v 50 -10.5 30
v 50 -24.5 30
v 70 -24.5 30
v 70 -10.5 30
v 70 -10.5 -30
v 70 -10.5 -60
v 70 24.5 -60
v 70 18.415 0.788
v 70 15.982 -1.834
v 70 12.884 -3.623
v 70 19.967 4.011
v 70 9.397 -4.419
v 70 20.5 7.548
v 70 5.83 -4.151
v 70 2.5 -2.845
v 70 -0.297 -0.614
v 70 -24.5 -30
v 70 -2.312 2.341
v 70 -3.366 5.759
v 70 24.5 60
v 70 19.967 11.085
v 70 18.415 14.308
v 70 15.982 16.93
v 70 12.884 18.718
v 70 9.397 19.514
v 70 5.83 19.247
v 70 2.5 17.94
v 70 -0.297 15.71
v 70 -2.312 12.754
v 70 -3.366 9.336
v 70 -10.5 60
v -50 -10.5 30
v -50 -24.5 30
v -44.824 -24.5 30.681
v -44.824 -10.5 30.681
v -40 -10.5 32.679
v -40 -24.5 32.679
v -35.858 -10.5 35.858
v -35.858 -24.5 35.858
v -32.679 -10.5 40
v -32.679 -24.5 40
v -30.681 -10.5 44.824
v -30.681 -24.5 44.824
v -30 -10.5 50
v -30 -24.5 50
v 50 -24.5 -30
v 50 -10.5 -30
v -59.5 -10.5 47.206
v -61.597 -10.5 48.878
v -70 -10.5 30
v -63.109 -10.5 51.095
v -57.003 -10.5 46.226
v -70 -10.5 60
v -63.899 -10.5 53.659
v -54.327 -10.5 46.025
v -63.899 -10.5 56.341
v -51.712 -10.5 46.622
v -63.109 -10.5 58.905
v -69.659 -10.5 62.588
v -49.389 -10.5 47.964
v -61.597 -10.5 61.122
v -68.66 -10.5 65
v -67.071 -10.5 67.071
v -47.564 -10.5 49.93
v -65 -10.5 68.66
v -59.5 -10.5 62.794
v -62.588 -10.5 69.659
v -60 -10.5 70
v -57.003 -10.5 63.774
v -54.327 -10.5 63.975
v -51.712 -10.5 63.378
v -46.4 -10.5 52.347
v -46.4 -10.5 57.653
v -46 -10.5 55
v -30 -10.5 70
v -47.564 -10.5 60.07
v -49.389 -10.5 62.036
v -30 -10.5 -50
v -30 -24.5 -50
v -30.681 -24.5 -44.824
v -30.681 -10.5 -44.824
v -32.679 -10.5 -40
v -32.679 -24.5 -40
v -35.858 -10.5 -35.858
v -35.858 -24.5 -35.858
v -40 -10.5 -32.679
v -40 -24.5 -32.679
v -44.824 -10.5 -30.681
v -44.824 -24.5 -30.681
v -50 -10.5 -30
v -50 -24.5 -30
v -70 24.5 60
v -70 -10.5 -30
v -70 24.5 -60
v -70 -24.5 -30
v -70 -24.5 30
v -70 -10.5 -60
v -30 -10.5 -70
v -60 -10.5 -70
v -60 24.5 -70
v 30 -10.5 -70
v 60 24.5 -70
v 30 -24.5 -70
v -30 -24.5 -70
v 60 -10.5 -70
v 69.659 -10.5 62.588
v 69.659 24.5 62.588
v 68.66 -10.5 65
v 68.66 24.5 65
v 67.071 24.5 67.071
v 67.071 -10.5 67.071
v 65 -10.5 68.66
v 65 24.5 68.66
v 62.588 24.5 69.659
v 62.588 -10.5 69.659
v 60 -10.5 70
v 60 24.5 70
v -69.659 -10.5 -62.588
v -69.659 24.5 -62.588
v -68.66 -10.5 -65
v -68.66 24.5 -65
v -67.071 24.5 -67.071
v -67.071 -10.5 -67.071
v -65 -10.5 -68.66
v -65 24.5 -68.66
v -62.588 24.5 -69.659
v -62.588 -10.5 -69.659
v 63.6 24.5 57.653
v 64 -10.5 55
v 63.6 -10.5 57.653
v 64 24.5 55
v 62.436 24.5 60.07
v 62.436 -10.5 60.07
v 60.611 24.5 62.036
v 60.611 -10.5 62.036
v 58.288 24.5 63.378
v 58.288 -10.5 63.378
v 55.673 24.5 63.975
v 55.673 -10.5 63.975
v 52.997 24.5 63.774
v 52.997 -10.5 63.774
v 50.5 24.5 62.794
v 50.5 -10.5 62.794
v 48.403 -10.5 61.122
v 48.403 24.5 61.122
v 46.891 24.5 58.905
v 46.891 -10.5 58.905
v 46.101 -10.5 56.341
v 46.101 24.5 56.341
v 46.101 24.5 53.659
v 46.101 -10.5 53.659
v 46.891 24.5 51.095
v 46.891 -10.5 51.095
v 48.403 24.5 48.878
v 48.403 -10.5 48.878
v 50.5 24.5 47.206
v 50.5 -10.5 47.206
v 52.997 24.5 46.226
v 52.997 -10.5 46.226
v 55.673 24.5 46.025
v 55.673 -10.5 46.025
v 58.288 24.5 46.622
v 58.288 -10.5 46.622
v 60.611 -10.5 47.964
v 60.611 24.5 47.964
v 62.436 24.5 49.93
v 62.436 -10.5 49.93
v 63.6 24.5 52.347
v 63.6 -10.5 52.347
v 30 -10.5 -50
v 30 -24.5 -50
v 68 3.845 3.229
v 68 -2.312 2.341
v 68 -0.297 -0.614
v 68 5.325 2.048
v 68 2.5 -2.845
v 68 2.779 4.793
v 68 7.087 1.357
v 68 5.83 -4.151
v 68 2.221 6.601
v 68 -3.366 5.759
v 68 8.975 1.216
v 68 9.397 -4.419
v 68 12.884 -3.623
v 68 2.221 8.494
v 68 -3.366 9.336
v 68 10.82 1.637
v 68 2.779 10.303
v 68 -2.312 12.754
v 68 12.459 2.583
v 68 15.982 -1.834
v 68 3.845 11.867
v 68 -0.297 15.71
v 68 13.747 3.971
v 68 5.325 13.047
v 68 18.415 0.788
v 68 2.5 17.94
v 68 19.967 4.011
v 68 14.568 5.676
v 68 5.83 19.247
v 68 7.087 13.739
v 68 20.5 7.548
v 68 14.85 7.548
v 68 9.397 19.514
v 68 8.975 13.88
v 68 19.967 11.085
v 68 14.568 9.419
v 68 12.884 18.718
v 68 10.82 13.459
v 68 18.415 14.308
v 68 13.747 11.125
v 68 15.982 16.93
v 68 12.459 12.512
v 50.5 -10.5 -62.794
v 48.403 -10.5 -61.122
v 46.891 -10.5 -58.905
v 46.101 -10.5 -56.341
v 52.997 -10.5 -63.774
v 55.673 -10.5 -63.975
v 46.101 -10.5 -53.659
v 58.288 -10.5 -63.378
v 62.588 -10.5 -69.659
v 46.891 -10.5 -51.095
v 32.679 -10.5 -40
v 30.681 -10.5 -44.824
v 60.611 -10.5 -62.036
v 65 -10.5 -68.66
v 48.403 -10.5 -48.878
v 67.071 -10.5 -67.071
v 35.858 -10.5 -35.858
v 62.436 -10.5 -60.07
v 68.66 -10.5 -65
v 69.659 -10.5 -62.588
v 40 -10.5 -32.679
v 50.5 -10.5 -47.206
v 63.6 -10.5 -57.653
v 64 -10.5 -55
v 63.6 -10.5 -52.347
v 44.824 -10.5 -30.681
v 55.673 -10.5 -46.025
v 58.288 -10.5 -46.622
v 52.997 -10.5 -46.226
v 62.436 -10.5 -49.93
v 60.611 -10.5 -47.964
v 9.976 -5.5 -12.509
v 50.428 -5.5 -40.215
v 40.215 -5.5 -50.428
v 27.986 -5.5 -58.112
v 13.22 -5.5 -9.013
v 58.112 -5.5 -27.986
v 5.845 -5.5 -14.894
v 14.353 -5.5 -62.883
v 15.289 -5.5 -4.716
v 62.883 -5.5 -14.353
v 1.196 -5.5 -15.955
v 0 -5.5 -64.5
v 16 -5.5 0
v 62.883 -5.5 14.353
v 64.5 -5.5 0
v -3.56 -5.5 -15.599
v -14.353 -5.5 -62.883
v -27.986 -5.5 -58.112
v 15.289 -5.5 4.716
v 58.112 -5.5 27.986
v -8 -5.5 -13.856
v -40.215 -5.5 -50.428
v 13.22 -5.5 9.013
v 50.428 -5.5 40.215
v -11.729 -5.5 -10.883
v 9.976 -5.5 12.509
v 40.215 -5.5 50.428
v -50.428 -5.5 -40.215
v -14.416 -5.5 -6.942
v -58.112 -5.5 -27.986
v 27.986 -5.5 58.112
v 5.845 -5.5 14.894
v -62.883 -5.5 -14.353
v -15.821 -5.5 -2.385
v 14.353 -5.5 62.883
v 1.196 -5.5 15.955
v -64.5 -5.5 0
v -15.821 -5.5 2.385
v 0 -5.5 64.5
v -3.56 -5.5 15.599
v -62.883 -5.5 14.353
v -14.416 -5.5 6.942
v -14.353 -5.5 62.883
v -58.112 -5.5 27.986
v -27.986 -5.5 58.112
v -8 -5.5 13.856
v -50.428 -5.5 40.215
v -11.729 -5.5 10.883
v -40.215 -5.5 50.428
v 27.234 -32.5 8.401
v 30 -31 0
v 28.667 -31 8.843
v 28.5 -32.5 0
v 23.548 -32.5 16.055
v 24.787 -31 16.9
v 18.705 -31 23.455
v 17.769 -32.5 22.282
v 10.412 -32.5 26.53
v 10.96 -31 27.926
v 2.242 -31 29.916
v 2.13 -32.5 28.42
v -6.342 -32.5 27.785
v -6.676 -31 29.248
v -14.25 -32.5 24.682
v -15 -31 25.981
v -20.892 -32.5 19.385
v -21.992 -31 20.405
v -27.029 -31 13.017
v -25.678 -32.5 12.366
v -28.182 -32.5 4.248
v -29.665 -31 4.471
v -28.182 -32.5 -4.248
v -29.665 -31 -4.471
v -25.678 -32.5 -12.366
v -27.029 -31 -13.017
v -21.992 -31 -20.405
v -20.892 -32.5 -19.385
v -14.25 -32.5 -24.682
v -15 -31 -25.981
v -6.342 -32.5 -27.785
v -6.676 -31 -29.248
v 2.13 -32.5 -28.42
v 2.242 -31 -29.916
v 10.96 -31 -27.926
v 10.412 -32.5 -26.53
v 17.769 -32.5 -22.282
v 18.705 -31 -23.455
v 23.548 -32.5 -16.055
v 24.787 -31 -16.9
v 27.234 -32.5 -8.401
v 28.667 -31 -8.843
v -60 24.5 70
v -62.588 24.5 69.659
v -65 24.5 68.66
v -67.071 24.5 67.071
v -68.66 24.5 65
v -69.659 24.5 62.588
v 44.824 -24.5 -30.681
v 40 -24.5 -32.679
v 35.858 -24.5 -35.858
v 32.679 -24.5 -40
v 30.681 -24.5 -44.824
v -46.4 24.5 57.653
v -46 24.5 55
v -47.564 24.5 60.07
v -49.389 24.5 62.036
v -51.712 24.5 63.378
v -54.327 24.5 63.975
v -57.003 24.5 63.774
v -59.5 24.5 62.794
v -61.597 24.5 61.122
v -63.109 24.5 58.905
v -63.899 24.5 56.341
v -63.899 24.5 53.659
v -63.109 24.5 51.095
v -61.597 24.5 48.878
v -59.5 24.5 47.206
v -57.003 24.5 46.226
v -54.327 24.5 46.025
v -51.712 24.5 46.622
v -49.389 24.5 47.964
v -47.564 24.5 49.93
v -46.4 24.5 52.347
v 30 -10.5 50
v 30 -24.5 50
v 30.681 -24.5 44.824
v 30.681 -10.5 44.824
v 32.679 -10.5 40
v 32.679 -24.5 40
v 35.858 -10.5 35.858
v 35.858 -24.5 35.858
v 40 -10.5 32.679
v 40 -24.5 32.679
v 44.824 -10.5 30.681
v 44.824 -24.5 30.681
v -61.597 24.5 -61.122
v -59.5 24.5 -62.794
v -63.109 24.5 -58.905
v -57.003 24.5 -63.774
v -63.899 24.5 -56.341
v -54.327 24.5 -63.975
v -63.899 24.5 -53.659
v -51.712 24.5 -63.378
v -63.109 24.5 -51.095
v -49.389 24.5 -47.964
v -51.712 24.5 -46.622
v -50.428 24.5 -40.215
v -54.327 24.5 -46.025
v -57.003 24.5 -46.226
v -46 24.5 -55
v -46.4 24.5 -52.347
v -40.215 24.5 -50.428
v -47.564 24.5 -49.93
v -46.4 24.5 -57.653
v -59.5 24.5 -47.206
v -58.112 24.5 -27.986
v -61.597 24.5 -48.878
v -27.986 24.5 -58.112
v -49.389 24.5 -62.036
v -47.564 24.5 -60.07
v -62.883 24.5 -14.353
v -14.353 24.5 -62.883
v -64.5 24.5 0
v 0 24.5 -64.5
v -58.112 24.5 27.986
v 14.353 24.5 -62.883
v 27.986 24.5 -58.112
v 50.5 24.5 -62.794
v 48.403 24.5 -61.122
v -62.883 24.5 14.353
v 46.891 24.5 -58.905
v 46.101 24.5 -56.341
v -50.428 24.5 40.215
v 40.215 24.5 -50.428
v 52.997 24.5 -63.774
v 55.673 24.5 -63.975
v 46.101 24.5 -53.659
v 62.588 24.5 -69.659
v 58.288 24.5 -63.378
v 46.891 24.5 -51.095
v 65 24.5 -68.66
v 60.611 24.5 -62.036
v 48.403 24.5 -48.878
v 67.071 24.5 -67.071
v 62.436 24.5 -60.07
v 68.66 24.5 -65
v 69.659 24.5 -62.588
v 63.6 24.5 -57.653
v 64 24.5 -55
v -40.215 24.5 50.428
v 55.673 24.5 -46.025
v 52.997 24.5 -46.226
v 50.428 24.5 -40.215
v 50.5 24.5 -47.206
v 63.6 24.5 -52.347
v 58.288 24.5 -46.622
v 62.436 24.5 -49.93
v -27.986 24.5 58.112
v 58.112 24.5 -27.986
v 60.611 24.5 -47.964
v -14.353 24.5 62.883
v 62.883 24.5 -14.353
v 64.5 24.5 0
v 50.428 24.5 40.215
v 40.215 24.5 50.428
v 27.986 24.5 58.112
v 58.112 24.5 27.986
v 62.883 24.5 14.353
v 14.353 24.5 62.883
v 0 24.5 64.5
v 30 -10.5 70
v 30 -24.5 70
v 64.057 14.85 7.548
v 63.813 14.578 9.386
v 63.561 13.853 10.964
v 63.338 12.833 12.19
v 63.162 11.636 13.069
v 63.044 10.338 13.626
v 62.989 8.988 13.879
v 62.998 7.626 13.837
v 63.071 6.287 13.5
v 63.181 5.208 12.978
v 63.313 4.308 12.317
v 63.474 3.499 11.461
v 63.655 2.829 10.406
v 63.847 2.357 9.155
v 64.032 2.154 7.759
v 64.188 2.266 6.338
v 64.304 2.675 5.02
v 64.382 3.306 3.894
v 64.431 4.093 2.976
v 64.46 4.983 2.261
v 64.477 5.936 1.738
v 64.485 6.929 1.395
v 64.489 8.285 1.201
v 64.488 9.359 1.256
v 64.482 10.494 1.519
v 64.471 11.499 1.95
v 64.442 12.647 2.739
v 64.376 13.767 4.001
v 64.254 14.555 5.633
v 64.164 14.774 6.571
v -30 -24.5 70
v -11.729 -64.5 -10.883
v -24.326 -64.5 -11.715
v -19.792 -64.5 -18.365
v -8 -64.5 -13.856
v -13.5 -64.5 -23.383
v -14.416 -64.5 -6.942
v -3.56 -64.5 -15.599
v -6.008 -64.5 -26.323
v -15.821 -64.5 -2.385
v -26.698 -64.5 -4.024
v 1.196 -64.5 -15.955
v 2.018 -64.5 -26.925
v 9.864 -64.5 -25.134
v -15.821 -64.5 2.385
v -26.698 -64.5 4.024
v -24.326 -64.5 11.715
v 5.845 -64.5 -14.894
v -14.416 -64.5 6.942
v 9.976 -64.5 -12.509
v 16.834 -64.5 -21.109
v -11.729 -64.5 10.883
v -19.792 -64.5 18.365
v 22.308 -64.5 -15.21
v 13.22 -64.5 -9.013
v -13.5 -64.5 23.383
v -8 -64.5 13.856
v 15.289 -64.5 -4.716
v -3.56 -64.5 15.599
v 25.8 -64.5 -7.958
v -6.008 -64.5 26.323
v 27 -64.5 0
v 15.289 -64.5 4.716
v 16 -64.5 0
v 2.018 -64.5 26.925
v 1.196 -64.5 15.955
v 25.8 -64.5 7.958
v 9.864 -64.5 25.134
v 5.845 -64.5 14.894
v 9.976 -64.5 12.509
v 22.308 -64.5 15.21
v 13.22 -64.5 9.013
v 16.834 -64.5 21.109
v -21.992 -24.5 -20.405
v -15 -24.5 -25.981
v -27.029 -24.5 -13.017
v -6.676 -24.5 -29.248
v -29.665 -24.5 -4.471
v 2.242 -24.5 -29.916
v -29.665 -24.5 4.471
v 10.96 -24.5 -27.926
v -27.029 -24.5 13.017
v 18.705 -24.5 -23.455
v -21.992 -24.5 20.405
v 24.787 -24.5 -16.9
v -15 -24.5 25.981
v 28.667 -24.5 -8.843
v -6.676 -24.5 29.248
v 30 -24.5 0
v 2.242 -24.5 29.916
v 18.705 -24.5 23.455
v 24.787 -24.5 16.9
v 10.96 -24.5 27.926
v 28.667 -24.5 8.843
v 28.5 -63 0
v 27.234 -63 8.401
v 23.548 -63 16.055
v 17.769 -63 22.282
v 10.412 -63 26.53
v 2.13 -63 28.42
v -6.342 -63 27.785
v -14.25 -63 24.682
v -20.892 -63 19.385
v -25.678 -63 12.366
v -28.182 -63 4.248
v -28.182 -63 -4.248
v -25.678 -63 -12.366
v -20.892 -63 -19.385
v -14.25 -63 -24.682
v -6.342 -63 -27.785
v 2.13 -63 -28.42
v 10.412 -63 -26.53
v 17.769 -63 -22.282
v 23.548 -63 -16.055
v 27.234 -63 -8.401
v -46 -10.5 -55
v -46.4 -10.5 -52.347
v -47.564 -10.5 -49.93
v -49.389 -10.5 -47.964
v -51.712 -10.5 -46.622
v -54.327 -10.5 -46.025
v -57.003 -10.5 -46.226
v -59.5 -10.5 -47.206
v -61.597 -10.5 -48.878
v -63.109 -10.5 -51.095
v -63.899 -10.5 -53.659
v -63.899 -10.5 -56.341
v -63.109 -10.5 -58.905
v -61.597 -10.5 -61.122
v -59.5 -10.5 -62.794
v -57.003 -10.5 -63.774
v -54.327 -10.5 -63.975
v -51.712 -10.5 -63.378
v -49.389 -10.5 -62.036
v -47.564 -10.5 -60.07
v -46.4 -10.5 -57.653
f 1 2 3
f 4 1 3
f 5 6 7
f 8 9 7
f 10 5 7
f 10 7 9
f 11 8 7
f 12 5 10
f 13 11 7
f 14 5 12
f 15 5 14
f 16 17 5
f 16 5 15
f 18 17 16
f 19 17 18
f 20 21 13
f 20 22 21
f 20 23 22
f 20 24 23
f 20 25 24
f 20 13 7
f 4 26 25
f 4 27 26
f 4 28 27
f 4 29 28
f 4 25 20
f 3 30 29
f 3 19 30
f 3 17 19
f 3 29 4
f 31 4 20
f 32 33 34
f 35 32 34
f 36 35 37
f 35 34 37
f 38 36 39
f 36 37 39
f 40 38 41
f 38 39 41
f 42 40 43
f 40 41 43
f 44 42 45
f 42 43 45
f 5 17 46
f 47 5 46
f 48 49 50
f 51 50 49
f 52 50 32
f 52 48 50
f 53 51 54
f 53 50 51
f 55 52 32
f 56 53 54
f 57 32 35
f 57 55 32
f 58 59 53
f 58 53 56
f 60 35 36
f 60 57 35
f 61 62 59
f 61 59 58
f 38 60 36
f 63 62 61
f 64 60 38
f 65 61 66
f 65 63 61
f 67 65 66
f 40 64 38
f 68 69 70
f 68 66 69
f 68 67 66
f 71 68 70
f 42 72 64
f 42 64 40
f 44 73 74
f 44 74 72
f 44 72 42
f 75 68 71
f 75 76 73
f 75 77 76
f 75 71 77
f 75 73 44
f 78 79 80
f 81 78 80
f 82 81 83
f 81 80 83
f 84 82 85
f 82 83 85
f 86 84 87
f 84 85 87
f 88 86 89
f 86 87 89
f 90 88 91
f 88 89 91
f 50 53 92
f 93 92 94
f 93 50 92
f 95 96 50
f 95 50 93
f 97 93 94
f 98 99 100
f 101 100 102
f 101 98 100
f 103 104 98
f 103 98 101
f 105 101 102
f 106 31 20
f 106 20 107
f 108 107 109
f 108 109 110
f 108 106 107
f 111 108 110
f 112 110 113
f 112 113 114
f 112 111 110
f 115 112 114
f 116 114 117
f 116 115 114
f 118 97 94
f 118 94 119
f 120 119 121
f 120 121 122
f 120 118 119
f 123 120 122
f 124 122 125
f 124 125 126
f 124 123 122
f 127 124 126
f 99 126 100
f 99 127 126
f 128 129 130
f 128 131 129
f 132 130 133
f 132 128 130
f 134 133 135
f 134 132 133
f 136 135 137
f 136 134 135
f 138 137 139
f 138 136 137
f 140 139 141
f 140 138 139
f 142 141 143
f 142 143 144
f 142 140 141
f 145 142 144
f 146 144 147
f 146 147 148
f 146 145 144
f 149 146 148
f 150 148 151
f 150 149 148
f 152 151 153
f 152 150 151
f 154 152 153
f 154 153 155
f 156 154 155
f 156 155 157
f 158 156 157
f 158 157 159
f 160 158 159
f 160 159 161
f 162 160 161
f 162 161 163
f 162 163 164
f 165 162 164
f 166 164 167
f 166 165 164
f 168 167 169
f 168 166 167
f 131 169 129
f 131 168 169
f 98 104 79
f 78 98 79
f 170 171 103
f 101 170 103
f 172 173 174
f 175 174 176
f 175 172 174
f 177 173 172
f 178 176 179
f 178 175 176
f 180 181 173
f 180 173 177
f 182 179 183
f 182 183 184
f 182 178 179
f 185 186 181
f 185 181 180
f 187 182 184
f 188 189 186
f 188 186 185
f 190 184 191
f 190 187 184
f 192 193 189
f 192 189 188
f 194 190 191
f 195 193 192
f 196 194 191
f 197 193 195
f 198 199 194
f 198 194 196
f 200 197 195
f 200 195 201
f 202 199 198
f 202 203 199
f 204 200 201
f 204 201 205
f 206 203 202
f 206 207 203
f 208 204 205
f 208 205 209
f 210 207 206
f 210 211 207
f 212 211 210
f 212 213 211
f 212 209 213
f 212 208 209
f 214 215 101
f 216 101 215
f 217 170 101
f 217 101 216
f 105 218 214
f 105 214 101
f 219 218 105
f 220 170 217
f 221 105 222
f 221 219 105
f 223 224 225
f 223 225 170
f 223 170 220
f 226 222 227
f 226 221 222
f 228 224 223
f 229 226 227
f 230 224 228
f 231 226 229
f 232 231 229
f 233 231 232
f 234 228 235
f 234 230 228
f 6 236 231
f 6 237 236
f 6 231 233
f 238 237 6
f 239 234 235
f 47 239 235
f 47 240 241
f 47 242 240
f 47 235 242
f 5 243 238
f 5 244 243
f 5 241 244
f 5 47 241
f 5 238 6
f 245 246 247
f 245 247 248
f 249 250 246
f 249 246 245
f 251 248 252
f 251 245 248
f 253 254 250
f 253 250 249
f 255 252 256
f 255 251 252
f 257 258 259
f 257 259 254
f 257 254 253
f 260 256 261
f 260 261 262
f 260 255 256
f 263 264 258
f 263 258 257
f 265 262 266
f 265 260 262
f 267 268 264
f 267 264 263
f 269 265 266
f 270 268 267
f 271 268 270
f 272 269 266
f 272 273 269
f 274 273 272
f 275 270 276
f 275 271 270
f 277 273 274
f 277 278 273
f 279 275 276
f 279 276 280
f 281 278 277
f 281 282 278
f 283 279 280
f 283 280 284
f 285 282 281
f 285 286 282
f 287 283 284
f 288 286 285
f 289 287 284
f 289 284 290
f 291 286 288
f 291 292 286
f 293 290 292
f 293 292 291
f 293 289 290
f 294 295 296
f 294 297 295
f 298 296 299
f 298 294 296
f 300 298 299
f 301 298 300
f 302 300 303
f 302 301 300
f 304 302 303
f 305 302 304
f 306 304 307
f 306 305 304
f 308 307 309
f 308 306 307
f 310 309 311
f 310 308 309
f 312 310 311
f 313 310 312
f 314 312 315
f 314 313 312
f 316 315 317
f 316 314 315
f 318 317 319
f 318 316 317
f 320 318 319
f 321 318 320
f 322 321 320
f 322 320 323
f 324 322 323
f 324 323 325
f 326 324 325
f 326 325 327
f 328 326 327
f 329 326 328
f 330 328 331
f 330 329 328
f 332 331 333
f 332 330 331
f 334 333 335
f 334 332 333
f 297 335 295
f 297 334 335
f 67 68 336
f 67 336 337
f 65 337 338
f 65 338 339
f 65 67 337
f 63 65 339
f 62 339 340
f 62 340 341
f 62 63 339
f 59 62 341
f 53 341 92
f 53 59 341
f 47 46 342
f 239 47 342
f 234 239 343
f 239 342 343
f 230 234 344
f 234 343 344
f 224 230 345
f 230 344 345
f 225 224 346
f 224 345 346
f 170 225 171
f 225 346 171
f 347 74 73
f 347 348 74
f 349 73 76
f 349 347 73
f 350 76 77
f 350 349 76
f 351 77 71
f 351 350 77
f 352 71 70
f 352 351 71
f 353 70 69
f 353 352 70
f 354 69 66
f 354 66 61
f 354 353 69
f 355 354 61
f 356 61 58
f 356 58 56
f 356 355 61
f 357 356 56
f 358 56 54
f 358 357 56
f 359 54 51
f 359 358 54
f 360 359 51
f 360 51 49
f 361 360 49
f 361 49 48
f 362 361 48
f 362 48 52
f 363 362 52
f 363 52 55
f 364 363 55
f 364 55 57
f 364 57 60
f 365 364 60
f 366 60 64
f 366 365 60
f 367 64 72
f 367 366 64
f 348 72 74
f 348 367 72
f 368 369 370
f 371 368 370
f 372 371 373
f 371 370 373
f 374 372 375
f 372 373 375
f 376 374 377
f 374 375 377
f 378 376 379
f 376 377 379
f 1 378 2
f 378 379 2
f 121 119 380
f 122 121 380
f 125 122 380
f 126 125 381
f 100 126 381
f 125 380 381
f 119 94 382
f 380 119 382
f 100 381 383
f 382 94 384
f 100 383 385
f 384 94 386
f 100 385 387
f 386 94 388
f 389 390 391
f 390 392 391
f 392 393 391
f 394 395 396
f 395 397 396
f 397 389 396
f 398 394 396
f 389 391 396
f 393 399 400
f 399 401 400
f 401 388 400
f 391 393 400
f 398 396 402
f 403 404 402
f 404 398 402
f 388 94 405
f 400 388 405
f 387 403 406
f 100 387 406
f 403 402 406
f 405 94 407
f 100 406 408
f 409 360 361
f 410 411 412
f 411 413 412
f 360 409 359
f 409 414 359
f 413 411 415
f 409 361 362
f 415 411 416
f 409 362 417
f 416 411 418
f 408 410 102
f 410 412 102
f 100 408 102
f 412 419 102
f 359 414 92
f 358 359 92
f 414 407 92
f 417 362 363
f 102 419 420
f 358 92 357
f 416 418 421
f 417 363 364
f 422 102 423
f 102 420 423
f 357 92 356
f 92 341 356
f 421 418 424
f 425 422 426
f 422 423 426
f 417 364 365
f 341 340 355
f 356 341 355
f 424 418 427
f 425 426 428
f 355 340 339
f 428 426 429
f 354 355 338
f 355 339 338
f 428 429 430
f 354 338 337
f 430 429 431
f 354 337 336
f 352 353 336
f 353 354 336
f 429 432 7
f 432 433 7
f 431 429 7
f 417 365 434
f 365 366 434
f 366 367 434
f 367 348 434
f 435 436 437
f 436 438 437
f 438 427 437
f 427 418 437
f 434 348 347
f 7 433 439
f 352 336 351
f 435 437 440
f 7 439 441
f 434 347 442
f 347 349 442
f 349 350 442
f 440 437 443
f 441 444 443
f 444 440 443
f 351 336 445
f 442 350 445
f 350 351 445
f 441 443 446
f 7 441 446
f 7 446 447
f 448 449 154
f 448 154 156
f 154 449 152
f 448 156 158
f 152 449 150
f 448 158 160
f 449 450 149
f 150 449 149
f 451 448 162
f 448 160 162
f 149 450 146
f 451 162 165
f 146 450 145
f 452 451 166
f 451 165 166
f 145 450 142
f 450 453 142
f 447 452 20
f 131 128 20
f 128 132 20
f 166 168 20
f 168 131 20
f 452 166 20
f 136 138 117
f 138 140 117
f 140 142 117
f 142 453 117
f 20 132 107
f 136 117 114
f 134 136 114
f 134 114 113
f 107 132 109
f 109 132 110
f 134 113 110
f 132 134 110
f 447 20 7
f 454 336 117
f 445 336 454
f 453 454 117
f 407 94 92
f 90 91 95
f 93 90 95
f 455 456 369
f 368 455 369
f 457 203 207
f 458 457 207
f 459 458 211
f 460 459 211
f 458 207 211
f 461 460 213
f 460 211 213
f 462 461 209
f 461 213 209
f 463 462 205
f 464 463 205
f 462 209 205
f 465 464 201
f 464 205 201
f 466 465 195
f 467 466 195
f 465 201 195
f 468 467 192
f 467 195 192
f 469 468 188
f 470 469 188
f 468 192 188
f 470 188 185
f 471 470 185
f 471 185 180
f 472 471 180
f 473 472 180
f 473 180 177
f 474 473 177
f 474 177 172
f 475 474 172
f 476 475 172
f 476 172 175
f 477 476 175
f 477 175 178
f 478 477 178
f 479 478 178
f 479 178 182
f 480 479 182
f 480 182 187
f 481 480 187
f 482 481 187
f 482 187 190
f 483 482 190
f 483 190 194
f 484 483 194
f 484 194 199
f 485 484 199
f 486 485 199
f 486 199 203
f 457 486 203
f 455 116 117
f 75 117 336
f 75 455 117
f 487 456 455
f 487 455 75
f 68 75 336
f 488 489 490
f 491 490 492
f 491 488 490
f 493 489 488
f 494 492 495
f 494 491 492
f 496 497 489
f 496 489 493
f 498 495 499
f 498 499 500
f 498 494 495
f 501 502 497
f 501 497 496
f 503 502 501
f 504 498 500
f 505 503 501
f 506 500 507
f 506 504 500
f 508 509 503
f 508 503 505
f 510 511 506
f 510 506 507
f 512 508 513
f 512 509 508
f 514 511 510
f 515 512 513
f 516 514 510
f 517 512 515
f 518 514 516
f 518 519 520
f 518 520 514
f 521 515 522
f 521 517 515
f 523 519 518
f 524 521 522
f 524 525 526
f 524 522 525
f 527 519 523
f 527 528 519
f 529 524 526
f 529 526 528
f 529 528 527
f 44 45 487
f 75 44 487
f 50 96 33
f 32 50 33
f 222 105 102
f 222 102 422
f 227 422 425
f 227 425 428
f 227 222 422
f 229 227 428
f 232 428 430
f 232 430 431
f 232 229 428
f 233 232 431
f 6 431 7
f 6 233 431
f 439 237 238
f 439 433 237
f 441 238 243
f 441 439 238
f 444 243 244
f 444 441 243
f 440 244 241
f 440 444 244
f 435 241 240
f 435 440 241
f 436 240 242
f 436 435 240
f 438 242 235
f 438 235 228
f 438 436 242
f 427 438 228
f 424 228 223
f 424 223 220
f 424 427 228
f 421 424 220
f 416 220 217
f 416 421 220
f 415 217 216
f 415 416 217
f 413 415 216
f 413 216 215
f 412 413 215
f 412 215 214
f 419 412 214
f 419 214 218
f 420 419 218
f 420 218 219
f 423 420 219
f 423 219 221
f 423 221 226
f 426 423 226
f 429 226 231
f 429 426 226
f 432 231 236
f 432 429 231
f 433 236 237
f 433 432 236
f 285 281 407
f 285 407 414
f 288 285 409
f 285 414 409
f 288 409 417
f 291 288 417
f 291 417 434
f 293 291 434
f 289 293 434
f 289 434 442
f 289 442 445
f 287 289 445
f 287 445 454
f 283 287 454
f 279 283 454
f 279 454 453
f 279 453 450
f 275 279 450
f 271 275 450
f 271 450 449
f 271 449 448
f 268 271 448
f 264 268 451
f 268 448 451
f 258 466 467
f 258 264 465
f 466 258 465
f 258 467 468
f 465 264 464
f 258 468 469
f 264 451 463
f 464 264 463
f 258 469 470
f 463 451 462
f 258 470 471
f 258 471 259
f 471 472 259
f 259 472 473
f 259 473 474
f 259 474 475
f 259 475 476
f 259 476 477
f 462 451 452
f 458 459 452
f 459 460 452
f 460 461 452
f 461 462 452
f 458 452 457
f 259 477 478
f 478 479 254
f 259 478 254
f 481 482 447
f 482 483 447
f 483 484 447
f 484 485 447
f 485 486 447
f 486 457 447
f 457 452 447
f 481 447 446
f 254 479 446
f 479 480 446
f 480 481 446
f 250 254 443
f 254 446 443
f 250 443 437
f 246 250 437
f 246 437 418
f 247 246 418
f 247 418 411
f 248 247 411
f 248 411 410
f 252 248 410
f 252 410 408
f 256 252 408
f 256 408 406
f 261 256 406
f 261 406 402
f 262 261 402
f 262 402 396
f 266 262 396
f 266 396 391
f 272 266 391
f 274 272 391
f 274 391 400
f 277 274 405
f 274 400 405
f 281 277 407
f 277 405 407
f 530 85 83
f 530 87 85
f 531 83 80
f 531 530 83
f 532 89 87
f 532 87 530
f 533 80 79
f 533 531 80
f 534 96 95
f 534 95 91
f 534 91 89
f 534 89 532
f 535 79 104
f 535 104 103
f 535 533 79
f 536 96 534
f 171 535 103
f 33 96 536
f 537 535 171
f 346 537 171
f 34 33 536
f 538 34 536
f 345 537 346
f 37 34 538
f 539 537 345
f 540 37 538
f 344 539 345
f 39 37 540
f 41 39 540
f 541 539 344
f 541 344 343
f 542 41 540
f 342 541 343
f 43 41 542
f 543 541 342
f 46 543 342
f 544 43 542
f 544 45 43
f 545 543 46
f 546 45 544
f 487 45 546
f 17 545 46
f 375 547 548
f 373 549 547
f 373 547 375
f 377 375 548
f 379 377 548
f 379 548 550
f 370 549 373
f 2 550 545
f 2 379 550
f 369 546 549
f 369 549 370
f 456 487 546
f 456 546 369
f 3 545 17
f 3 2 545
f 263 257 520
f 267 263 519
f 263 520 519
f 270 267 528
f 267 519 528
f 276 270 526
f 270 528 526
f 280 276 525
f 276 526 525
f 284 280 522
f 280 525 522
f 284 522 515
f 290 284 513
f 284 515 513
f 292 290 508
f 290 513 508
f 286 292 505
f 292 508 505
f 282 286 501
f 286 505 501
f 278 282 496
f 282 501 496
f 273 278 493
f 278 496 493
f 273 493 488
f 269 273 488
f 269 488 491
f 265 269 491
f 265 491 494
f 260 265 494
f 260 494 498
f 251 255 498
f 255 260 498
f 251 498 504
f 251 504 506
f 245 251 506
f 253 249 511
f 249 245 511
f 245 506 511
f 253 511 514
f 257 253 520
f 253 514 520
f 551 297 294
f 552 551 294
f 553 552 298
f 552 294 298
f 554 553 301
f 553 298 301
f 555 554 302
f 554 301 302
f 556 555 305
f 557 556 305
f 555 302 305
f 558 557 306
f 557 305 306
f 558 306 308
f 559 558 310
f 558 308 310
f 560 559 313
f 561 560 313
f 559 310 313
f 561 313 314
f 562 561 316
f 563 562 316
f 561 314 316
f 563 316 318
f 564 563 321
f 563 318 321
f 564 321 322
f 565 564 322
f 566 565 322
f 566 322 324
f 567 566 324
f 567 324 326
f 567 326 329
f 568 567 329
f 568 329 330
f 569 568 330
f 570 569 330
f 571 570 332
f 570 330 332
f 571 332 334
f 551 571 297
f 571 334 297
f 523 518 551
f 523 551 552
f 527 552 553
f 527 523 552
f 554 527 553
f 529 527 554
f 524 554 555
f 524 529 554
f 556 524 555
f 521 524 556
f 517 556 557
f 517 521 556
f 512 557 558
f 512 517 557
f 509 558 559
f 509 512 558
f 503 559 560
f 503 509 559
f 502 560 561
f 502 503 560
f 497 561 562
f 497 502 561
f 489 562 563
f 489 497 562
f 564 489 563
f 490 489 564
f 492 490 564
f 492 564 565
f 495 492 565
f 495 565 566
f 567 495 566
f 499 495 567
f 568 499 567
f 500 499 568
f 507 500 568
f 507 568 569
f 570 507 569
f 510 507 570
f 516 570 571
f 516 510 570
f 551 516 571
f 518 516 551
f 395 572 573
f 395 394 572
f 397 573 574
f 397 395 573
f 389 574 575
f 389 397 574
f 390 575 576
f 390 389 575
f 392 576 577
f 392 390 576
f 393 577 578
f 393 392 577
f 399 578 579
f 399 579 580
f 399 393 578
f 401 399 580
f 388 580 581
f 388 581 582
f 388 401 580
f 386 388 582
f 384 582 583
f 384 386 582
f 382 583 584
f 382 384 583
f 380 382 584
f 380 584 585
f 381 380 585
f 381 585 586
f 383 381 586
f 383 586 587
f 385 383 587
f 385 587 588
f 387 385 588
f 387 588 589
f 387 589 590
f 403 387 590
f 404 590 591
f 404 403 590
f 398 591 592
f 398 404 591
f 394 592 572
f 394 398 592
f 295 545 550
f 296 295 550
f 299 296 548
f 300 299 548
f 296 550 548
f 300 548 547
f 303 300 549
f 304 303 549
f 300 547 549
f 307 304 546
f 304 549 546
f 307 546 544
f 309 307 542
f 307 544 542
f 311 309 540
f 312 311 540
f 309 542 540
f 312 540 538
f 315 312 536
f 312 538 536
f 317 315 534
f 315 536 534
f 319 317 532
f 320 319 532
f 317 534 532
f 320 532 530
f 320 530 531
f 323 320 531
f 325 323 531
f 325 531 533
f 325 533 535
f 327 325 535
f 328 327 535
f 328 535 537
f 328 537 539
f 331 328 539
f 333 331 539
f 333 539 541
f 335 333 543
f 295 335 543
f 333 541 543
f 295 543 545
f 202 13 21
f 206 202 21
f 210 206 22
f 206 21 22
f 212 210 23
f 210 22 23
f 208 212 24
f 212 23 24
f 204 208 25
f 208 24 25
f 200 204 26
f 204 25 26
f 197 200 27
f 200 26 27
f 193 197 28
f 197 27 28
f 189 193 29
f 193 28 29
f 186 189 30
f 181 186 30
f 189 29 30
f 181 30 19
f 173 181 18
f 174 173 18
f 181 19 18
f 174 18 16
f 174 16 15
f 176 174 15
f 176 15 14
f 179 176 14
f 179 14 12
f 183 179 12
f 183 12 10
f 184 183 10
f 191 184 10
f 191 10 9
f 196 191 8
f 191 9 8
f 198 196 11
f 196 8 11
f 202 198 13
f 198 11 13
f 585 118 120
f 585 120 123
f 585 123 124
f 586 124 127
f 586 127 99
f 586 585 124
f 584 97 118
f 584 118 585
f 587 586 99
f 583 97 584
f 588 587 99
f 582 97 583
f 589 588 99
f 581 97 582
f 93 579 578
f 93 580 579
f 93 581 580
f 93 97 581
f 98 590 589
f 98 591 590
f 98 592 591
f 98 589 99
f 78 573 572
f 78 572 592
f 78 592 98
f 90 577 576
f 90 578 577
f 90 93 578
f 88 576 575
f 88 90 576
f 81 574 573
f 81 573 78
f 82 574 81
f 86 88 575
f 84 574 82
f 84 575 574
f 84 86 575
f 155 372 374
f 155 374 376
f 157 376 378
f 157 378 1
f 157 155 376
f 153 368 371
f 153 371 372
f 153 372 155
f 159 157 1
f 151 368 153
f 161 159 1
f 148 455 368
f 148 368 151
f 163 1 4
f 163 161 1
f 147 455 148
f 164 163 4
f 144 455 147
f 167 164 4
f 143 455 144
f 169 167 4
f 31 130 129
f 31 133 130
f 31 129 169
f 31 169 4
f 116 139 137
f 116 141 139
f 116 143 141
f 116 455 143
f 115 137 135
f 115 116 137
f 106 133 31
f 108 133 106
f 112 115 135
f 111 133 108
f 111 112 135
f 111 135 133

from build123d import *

# Parameters (mm, degrees)
F0_R      = 9
F1_DEPTH  = 24.5
F2_R      = 9
F3_DEPTH  = 14
F4_R      = 30
F5_DEPTH  = 8
F6_SIZE   = 1.5
F7_R      = 28.5
F8_DEPTH  = 32
F9_SIZE   = 1.5
F10_R     = 16
F11_DEPTH = 89.001
F12_R     = 64.5
F12_R_2   = 16
F13_DEPTH = 30
F14_R     = 12
F14_R_2   = 6.35
F15_DEPTH = 2
F16_DEPTH = 9


with BuildPart() as f1:
    # F0 (on Front) → F1 (new body, symmetric)
    with BuildSketch(Plane.XZ):
        with BuildLine():
            Line((-60, -70), (60, -70))
            ThreePointArc((60, -70), (67.0710678119, -67.0710678119), (70, -60))
            Line((70, -60), (70, 60))
            ThreePointArc((70, 60), (67.0710678119, 67.0710678119), (60, 70))
            Line((60, 70), (-60, 70))
            ThreePointArc((-60, 70), (-67.0710678119, 67.0710678119), (-70, 60))
            Line((-70, 60), (-70, -60))
            ThreePointArc((-70, -60), (-67.0710678119, -67.0710678119), (-60, -70))
        make_face()
        with Locations((-55, -55)):
            Circle(F0_R, mode=Mode.SUBTRACT)
        with Locations((55, -55)):
            Circle(F0_R, mode=Mode.SUBTRACT)
        with Locations((-55, 55)):
            Circle(F0_R, mode=Mode.SUBTRACT)
        with Locations((55, 55)):
            Circle(F0_R, mode=Mode.SUBTRACT)
    extrude(amount=F1_DEPTH, both=True)

    # F2 (on face) → F3 (cut)
    with BuildSketch(Plane.XZ.offset(24.5)):
        with BuildLine():
            Line((30, -50), (30, -70))
            Line((30, -70), (60, -70))
            ThreePointArc((60, -70), (67.0710678119, -67.0710678119), (70, -60))
            Line((70, -60), (70, -30))
            Line((70, -30), (50, -30))
            ThreePointArc((50, -30), (35.8578643763, -35.8578643763), (30, -50))
        make_face()
        with Locations((55, -55)):
            Circle(F2_R, mode=Mode.SUBTRACT)
        with BuildLine():
            Line((60, 70), (30, 70))
            Line((30, 70), (30, 50))
            ThreePointArc((30, 50), (35.8578643763, 35.8578643763), (50, 30))
            Line((50, 30), (70, 30))
            Line((70, 30), (70, 60))
            ThreePointArc((70, 60), (67.0710678119, 67.0710678119), (60, 70))
        make_face()
        with Locations((55, 55)):
            Circle(F2_R, mode=Mode.SUBTRACT)
        with BuildLine():
            Line((-70, 60), (-70, 30))
            Line((-70, 30), (-50, 30))
            ThreePointArc((-50, 30), (-35.8578643763, 35.8578643763), (-30, 50))
            Line((-30, 50), (-30, 70))
            Line((-30, 70), (-60, 70))
            ThreePointArc((-60, 70), (-67.0710678119, 67.0710678119), (-70, 60))
        make_face()
        with Locations((-55, 55)):
            Circle(F2_R, mode=Mode.SUBTRACT)
        with BuildLine():
            Line((-50, -30), (-70, -30))
            Line((-70, -30), (-70, -60))
            ThreePointArc((-70, -60), (-67.0710678119, -67.0710678119), (-60, -70))
            Line((-60, -70), (-30, -70))
            Line((-30, -70), (-30, -50))
            ThreePointArc((-30, -50), (-35.8578643763, -35.8578643763), (-50, -30))
        make_face()
        with Locations((-55, -55)):
            Circle(F2_R, mode=Mode.SUBTRACT)
    extrude(amount=-F3_DEPTH, mode=Mode.SUBTRACT)

    # F4 (on face) → F5 (join)
    with BuildSketch(Plane.XZ.offset(24.5)):
        Circle(F4_R)
    extrude(amount=F5_DEPTH)

    # F6
    f6_edges = [f1.edges().sort_by_distance(p)[0] for p in [
        (-30, -32.5, 0),
    ]]
    chamfer(f6_edges, length=F6_SIZE)

    # F7 (on face) → F8 (join)
    with BuildSketch(Plane.XZ.offset(32.5)):
        Circle(F7_R)
    extrude(amount=F8_DEPTH)

    # F9
    f9_edges = [f1.edges().sort_by_distance(p)[0] for p in [
        (-28.5, -64.5, 0),
    ]]
    chamfer(f9_edges, length=F9_SIZE)

    # F10 (on face) → F11 (cut, through all)
    with BuildSketch(Plane.XZ.offset(64.5)):
        Circle(F10_R)
    extrude(amount=-F11_DEPTH, mode=Mode.SUBTRACT)

    # F12 (on face) → F13 (cut)
    with BuildSketch(Plane(origin=(0, 24.5, 0), x_dir=(-1, 0, 0), z_dir=(0, 1, 0))):
        Circle(F12_R)
        Circle(F12_R_2, mode=Mode.SUBTRACT)
    extrude(amount=-F13_DEPTH, mode=Mode.SUBTRACT)

    # F14 (on face) → F15 (cut)
    with BuildSketch(Plane.YZ.offset(70)):
        with Locations((8.5, 7.547759451)):
            Circle(F14_R)
        with Locations((8.5, 7.547759451)):
            Circle(F14_R_2, mode=Mode.SUBTRACT)
    extrude(amount=-F15_DEPTH, mode=Mode.SUBTRACT)

    # F16 (cut): a face of the model
    f16_faces = [f1.faces().sort_by_distance(p)[0] for p in [
        (70, 8.5, 7.547759451),
    ]]
    extrude(f16_faces, amount=-F16_DEPTH, mode=Mode.SUBTRACT)


solid = f1.part
